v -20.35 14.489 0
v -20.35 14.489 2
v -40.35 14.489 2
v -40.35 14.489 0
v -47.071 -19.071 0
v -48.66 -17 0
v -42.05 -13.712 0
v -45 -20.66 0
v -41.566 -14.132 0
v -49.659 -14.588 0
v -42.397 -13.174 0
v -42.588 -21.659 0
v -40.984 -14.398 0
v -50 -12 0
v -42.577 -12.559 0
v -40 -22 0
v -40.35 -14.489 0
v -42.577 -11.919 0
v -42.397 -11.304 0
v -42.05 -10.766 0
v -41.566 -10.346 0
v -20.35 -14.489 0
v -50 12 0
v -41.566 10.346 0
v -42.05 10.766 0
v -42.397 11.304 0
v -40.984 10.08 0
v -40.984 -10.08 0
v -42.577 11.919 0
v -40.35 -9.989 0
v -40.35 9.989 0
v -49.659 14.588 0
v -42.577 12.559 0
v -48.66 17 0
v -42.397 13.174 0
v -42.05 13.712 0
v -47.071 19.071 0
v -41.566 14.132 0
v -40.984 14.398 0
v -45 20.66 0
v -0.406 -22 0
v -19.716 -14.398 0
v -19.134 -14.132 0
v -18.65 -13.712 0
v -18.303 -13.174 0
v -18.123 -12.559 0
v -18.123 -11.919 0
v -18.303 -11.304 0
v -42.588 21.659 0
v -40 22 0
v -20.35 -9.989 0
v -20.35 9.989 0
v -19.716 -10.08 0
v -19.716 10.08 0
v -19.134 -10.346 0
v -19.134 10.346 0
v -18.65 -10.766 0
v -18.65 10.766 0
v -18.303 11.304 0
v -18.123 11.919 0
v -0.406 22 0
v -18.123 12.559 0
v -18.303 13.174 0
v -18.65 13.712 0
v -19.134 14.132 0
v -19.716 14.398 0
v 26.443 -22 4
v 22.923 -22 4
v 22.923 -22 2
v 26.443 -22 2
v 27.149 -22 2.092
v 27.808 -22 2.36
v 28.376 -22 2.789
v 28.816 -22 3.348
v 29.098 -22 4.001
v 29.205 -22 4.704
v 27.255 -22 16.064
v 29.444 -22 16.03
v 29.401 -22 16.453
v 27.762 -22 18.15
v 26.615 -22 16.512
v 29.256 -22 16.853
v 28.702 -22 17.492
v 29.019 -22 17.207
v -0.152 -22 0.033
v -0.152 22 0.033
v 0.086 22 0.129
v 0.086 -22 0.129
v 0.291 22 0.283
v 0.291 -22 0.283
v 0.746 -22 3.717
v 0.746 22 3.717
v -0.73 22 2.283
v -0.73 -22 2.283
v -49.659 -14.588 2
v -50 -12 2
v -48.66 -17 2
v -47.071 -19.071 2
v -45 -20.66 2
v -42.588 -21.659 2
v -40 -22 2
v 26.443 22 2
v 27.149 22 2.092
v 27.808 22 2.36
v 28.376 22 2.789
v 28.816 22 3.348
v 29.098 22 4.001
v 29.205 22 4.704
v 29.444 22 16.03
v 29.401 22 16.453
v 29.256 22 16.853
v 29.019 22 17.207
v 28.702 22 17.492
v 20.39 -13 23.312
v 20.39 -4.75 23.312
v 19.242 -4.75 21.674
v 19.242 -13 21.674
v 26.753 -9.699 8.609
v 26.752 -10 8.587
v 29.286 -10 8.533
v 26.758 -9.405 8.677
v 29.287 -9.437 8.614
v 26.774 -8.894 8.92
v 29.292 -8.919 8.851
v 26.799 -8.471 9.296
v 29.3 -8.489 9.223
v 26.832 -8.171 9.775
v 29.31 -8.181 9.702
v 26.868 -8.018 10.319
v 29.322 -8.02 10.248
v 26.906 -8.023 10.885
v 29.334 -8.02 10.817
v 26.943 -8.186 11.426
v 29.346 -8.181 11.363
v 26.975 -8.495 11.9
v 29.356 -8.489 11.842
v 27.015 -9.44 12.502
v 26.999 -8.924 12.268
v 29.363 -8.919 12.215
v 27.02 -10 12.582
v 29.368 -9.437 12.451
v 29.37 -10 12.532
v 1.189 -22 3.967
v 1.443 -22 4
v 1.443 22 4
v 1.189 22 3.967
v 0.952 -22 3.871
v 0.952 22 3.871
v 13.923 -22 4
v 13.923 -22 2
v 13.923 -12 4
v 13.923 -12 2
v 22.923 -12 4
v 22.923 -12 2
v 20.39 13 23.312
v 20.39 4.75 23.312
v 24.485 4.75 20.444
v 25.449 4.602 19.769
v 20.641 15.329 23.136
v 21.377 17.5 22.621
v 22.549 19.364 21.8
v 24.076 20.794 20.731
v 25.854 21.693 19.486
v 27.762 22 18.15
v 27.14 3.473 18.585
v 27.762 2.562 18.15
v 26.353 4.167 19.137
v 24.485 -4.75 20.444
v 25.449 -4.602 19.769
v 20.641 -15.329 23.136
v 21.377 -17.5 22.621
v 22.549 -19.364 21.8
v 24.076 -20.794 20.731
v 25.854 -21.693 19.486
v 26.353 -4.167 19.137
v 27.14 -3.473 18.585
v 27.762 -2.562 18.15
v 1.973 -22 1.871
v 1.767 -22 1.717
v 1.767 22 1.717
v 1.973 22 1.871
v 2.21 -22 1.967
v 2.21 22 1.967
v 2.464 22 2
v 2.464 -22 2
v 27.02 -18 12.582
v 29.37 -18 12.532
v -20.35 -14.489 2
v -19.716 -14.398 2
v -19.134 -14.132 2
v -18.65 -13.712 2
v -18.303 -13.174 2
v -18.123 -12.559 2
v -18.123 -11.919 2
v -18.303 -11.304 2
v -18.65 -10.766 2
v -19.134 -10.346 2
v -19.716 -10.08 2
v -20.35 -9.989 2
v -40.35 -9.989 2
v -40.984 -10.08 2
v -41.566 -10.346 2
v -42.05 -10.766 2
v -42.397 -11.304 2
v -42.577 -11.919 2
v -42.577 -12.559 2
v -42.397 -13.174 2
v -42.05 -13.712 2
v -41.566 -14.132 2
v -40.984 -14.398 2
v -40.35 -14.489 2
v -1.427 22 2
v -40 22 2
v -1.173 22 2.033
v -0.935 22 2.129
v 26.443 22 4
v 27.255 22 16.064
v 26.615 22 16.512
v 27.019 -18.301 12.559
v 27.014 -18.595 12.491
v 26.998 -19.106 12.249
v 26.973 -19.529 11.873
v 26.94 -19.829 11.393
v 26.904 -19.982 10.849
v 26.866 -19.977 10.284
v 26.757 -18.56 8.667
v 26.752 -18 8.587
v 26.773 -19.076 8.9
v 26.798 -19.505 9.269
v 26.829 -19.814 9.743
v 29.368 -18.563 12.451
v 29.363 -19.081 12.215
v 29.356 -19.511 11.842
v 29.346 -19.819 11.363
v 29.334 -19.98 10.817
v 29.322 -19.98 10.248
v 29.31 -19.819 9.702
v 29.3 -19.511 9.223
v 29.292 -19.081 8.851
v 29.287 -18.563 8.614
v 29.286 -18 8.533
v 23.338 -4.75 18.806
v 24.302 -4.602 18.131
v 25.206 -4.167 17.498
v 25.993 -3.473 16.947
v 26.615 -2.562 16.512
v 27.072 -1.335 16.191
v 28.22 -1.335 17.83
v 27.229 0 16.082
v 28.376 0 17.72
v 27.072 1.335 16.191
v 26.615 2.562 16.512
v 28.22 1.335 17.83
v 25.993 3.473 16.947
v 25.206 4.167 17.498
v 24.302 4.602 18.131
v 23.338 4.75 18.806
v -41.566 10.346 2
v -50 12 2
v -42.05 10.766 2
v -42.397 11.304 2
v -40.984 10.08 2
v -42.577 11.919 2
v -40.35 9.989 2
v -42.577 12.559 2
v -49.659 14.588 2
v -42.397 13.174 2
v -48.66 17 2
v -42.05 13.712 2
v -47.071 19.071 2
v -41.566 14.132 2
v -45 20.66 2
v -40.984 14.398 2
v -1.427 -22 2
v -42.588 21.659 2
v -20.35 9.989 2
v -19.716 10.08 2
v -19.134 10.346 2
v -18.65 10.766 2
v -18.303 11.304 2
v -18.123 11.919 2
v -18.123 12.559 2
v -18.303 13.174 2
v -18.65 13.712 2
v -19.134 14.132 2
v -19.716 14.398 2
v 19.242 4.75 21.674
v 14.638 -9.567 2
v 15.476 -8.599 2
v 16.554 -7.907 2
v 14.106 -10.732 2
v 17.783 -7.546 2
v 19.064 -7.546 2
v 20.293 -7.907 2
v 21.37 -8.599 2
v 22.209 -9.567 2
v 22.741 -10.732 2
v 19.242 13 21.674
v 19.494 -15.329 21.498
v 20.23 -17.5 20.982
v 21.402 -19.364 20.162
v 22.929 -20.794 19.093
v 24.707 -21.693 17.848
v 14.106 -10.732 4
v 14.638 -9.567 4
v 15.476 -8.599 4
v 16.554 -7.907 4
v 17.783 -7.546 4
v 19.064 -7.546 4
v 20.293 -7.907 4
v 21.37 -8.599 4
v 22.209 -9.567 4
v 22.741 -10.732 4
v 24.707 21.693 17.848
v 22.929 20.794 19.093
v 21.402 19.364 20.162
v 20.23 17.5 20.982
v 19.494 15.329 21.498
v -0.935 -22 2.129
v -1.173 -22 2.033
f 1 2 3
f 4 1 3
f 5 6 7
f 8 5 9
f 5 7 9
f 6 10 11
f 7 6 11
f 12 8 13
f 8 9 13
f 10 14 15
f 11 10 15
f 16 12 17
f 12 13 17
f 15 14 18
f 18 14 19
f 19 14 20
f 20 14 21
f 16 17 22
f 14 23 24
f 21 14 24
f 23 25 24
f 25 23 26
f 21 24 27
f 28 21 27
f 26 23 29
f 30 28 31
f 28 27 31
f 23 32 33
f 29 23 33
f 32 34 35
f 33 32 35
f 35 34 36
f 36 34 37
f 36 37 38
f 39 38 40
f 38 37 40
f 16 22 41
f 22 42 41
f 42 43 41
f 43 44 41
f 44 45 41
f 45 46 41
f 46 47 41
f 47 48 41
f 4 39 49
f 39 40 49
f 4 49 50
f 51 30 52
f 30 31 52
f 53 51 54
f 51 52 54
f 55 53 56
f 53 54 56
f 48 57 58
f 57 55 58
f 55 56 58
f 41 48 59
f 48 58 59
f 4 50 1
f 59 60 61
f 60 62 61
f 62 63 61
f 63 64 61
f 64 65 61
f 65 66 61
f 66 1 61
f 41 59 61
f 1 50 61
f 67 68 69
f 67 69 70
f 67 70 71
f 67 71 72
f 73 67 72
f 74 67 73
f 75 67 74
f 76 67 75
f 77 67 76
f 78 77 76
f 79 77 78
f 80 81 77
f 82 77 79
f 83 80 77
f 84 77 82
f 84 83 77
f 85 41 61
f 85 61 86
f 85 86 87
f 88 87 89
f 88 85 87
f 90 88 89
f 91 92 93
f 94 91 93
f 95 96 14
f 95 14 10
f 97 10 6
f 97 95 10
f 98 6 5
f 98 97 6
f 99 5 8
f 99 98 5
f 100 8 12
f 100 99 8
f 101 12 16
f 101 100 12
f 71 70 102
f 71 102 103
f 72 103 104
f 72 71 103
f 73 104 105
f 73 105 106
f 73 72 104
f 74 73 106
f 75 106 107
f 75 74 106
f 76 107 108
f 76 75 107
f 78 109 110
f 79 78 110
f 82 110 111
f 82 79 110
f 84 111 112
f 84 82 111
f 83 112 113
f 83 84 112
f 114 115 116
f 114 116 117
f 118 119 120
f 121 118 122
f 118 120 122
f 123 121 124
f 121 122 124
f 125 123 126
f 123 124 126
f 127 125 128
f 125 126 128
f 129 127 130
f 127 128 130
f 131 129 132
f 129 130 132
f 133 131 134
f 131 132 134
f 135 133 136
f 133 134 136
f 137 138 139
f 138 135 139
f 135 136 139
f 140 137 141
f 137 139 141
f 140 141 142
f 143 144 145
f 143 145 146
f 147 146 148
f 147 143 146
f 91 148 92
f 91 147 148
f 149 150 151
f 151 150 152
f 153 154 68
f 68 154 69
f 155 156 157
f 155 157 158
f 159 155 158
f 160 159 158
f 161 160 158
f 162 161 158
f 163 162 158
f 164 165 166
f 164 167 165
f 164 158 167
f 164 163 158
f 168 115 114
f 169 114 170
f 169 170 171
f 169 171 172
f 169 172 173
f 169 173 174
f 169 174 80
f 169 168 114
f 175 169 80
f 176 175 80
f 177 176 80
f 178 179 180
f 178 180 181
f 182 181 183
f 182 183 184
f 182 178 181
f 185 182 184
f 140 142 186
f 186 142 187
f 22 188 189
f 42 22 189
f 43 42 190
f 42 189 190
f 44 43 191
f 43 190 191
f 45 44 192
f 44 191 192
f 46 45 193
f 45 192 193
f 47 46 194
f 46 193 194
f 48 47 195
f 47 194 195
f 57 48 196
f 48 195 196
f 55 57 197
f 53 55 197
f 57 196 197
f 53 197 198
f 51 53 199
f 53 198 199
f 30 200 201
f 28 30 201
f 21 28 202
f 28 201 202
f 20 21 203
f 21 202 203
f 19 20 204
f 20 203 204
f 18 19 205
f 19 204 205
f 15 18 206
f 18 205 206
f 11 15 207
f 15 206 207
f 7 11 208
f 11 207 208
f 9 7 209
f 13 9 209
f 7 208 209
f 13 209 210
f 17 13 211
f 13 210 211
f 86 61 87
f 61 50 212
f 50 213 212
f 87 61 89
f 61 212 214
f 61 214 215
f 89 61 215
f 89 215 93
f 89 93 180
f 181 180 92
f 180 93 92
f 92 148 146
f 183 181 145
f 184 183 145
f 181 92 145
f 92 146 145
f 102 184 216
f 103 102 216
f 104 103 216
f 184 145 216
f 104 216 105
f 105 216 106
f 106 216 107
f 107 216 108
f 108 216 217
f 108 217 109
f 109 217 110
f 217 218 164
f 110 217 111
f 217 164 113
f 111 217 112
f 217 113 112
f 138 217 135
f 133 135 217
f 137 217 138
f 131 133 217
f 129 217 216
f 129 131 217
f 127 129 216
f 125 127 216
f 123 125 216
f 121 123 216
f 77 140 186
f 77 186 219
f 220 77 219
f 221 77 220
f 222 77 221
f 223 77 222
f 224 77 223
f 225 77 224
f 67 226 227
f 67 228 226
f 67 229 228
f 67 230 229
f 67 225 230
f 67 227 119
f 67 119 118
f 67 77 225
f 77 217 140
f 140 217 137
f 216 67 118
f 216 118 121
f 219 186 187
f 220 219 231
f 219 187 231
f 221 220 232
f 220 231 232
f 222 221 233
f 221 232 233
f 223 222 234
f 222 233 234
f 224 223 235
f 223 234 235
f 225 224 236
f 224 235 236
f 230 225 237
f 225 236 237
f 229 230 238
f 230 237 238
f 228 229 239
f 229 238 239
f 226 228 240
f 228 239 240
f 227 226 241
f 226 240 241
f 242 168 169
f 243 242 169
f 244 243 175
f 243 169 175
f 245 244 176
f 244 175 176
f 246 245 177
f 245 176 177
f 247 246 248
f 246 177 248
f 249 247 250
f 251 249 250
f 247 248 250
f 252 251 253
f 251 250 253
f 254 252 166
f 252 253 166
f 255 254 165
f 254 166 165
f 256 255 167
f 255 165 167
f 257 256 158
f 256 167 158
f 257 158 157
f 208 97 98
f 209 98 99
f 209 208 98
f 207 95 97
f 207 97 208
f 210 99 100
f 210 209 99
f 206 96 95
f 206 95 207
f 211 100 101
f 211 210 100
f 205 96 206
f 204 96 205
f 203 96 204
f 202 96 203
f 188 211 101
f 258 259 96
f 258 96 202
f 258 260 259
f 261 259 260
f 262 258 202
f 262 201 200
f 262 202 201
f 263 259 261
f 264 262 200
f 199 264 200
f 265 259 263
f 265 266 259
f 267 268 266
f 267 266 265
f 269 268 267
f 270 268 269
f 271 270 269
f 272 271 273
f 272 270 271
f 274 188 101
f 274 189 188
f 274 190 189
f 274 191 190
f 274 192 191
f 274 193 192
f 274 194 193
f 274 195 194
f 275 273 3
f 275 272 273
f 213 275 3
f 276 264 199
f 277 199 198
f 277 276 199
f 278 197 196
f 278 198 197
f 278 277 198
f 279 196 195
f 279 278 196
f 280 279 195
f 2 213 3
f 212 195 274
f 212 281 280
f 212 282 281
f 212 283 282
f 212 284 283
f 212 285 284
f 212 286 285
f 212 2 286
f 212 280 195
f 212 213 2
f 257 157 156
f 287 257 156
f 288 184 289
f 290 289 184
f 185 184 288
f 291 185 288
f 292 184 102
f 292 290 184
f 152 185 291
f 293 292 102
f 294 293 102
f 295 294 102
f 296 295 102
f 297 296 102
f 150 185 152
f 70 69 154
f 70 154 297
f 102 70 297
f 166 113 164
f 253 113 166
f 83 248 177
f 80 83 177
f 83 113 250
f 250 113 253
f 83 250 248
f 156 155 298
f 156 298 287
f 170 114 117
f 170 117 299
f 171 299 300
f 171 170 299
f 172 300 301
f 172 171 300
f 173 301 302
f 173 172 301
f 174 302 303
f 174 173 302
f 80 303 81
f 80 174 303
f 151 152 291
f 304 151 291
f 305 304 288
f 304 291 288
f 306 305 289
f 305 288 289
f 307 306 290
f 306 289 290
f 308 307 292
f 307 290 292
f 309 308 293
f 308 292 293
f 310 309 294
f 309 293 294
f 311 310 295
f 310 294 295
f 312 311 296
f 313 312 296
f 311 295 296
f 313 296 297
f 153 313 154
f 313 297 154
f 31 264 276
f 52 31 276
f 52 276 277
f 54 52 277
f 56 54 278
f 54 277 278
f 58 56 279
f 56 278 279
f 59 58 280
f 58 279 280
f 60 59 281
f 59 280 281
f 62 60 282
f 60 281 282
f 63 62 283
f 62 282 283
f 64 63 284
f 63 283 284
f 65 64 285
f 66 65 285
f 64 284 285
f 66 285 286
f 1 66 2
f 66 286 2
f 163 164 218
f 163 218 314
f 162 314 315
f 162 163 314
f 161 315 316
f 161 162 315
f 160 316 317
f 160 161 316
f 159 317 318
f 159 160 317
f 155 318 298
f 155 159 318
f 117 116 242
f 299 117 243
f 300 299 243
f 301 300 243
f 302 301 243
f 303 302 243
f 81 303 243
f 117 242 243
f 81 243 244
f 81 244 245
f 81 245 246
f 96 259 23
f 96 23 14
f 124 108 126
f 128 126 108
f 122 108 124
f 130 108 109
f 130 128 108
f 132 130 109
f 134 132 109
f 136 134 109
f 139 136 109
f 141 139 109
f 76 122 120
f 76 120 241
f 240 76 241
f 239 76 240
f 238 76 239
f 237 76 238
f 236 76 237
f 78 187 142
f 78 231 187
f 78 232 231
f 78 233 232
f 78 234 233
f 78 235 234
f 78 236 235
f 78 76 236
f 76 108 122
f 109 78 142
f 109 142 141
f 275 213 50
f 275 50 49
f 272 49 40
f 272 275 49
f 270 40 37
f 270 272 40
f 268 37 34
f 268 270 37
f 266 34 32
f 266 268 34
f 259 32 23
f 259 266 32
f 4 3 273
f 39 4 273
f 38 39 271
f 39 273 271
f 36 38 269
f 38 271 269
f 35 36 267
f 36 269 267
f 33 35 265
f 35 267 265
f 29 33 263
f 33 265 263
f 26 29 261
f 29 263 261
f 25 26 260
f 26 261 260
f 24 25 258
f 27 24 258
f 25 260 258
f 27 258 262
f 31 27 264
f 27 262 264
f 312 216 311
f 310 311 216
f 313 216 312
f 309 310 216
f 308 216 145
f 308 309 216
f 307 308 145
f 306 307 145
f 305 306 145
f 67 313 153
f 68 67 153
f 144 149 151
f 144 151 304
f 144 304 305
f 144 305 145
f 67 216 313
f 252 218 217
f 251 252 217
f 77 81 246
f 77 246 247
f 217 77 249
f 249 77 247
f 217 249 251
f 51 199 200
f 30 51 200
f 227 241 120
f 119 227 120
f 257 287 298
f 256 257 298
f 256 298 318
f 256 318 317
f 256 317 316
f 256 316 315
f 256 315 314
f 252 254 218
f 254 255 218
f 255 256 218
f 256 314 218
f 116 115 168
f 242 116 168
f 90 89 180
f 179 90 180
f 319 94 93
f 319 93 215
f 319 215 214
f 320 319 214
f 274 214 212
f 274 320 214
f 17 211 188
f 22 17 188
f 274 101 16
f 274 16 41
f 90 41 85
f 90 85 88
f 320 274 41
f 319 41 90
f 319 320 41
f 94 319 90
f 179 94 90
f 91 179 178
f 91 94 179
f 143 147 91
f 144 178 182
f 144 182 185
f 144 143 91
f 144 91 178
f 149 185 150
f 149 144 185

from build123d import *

# Parameters (mm, degrees)
F1_DEPTH  = 22
F3_DEPTH  = 2
F5_DEPTH  = 2
F7_DEPTH  = 3.5346013901
F9_DEPTH  = 2
F11_DEPTH = 2
F13_DEPTH = 2


with BuildPart() as f1:
    # F0 (on Front) → F1 (new body, symmetric)
    with BuildSketch(Plane.XZ):
        with BuildLine():
            Line((-40, 0), (-0.4058037769, 0))
            ThreePointArc((-0.4058037769, 0), (-0.0297816599, 0.0733893118), (0.2910484483, 0.2827852649))
            Line((0.2910484483, 0.2827852649), (1.7673929517, 1.7172147351))
            ThreePointArc((1.7673929517, 1.7172147351), (2.0882230599, 1.9266106882), (2.4642451769, 2))
            Line((2.4642451769, 2), (26.4432451769, 2))
            ThreePointArc((26.4432451769, 2), (28.3757802079, 2.7885630779), (29.2049477192, 4.7040276722))
            Line((29.2049477192, 4.7040276722), (29.4439892244, 16.0295052851))
            ThreePointArc((29.4439892244, 16.0295052851), (29.2561671236, 16.853335151), (28.7023996666, 17.4915470225))
            Line((28.7023996666, 17.4915470225), (27.7620131197, 18.1500127714))
            Line((27.7620131197, 18.1500127714), (26.614860247, 16.5117086828))
            Line((26.614860247, 16.5117086828), (27.2546179936, 16.0637454861))
            Line((27.2546179936, 16.0637454861), (26.4432451769, 4))
            Line((26.4432451769, 4), (1.4432451769, 4))
            ThreePointArc((1.4432451769, 4), (1.0672230599, 3.9266106882), (0.7463929517, 3.7172147351))
            Line((0.7463929517, 3.7172147351), (-0.7299515517, 2.2827852649))
            ThreePointArc((-0.7299515517, 2.2827852649), (-1.0507816599, 2.0733893118), (-1.4268037769, 2))
            Line((-1.4268037769, 2), (-40, 2))
            Line((-40, 2), (-40, 0))
        make_face()
    extrude(amount=F1_DEPTH, both=True)

    # F2 (on face) → F3 (join)
    with BuildSketch(Plane.XY.offset(2)):
        with BuildLine():
            Line((-50, 12), (-50, -12))
            ThreePointArc((-50, -12), (-47.0710678119, -19.0710678119), (-40, -22))
            Line((-40, -22), (-40, 22))
            ThreePointArc((-40, 22), (-47.0710678119, 19.0710678119), (-50, 12))
        make_face()
    extrude(amount=-F3_DEPTH)

    # F4 (on face) → F5 (cut, through all)
    with BuildSketch(Plane.XY.offset(2)):
        with BuildLine():
            ThreePointArc((-40.35, 14.489), (-42.6, 12.239), (-40.35, 9.989))
            Line((-40.35, 9.989), (-20.35, 9.989))
            ThreePointArc((-20.35, 9.989), (-18.1, 12.239), (-20.35, 14.489))
            Line((-20.35, 14.489), (-40.35, 14.489))
        make_face()
        with BuildLine():
            Line((-20.35, -9.989), (-40.35, -9.989))
            ThreePointArc((-40.35, -9.989), (-42.6, -12.239), (-40.35, -14.489))
            Line((-40.35, -14.489), (-20.35, -14.489))
            ThreePointArc((-20.35, -14.489), (-18.1, -12.239), (-20.35, -9.989))
        make_face()
    extrude(amount=-F5_DEPTH, mode=Mode.SUBTRACT)

    # F6 (on face) → F7 (cut, up to face)
    with BuildSketch(Plane(origin=(29.0927016527, 0, -0.6140459087), x_dir=(0, 1, 0), z_dir=(0.9997773316, 0, -0.0211018278))):
        with BuildLine():
            Line((-10, 13.1492580114), (-18, 13.1492580114))
            ThreePointArc((-18, 13.1492580114), (-20, 11.1492580114), (-18, 9.1492580114))
            Line((-18, 9.1492580114), (-10, 9.1492580114))
            ThreePointArc((-10, 9.1492580114), (-8, 11.1492580114), (-10, 13.1492580114))
        make_face()
    extrude(amount=-F7_DEPTH, mode=Mode.SUBTRACT)

    # F8 (on face) → F9 (join, through all)
    with BuildSketch(Plane(origin=(17.661139241, 0, 25.2227208038), x_dir=(0.8191520443, 0, -0.5735764364), z_dir=(0.5735764364, 0, 0.8191520443))):
        with BuildLine():
            Line((3.3308901554, 13), (3.3308901554, -13))
            ThreePointArc((3.3308901554, -13), (5.9669291247, -19.3639610307), (12.3308901554, -22))
            Line((12.3308901554, -22), (12.3308901554, 22))
            ThreePointArc((12.3308901554, 22), (5.9669291247, 19.3639610307), (3.3308901554, 13))
        make_face()
    extrude(amount=-F9_DEPTH)

    # F10 (on face) → F11 (cut, through all)
    with BuildSketch(Plane(origin=(17.661139241, 0, 25.2227208038), x_dir=(0.8191520443, 0, -0.5735764364), z_dir=(0.5735764364, 0, 0.8191520443))):
        with BuildLine():
            Line((3.3308901554, 4.75), (3.3308901554, -4.75))
            Line((3.3308901554, -4.75), (8.3308901554, -4.75))
            ThreePointArc((8.3308901554, -4.75), (13.0808901554, 0), (8.3308901554, 4.75))
            Line((8.3308901554, 4.75), (3.3308901554, 4.75))
        make_face()
    extrude(amount=-F11_DEPTH, mode=Mode.SUBTRACT)

    # F12 (on face) → F13 (cut, through all)
    with BuildSketch(Plane(origin=(0, 0, 2), x_dir=(1, 0, 0), z_dir=(0, 0, -1))):
        with BuildLine():
            Line((22.9232451769, 12), (22.9232451769, 22))
            Line((22.9232451769, 22), (13.9232451769, 22))
            Line((13.9232451769, 22), (13.9232451769, 12))
            ThreePointArc((13.9232451769, 12), (18.4232451769, 7.5), (22.9232451769, 12))
        make_face()
    extrude(amount=-F13_DEPTH, mode=Mode.SUBTRACT)


solid = f1.part
